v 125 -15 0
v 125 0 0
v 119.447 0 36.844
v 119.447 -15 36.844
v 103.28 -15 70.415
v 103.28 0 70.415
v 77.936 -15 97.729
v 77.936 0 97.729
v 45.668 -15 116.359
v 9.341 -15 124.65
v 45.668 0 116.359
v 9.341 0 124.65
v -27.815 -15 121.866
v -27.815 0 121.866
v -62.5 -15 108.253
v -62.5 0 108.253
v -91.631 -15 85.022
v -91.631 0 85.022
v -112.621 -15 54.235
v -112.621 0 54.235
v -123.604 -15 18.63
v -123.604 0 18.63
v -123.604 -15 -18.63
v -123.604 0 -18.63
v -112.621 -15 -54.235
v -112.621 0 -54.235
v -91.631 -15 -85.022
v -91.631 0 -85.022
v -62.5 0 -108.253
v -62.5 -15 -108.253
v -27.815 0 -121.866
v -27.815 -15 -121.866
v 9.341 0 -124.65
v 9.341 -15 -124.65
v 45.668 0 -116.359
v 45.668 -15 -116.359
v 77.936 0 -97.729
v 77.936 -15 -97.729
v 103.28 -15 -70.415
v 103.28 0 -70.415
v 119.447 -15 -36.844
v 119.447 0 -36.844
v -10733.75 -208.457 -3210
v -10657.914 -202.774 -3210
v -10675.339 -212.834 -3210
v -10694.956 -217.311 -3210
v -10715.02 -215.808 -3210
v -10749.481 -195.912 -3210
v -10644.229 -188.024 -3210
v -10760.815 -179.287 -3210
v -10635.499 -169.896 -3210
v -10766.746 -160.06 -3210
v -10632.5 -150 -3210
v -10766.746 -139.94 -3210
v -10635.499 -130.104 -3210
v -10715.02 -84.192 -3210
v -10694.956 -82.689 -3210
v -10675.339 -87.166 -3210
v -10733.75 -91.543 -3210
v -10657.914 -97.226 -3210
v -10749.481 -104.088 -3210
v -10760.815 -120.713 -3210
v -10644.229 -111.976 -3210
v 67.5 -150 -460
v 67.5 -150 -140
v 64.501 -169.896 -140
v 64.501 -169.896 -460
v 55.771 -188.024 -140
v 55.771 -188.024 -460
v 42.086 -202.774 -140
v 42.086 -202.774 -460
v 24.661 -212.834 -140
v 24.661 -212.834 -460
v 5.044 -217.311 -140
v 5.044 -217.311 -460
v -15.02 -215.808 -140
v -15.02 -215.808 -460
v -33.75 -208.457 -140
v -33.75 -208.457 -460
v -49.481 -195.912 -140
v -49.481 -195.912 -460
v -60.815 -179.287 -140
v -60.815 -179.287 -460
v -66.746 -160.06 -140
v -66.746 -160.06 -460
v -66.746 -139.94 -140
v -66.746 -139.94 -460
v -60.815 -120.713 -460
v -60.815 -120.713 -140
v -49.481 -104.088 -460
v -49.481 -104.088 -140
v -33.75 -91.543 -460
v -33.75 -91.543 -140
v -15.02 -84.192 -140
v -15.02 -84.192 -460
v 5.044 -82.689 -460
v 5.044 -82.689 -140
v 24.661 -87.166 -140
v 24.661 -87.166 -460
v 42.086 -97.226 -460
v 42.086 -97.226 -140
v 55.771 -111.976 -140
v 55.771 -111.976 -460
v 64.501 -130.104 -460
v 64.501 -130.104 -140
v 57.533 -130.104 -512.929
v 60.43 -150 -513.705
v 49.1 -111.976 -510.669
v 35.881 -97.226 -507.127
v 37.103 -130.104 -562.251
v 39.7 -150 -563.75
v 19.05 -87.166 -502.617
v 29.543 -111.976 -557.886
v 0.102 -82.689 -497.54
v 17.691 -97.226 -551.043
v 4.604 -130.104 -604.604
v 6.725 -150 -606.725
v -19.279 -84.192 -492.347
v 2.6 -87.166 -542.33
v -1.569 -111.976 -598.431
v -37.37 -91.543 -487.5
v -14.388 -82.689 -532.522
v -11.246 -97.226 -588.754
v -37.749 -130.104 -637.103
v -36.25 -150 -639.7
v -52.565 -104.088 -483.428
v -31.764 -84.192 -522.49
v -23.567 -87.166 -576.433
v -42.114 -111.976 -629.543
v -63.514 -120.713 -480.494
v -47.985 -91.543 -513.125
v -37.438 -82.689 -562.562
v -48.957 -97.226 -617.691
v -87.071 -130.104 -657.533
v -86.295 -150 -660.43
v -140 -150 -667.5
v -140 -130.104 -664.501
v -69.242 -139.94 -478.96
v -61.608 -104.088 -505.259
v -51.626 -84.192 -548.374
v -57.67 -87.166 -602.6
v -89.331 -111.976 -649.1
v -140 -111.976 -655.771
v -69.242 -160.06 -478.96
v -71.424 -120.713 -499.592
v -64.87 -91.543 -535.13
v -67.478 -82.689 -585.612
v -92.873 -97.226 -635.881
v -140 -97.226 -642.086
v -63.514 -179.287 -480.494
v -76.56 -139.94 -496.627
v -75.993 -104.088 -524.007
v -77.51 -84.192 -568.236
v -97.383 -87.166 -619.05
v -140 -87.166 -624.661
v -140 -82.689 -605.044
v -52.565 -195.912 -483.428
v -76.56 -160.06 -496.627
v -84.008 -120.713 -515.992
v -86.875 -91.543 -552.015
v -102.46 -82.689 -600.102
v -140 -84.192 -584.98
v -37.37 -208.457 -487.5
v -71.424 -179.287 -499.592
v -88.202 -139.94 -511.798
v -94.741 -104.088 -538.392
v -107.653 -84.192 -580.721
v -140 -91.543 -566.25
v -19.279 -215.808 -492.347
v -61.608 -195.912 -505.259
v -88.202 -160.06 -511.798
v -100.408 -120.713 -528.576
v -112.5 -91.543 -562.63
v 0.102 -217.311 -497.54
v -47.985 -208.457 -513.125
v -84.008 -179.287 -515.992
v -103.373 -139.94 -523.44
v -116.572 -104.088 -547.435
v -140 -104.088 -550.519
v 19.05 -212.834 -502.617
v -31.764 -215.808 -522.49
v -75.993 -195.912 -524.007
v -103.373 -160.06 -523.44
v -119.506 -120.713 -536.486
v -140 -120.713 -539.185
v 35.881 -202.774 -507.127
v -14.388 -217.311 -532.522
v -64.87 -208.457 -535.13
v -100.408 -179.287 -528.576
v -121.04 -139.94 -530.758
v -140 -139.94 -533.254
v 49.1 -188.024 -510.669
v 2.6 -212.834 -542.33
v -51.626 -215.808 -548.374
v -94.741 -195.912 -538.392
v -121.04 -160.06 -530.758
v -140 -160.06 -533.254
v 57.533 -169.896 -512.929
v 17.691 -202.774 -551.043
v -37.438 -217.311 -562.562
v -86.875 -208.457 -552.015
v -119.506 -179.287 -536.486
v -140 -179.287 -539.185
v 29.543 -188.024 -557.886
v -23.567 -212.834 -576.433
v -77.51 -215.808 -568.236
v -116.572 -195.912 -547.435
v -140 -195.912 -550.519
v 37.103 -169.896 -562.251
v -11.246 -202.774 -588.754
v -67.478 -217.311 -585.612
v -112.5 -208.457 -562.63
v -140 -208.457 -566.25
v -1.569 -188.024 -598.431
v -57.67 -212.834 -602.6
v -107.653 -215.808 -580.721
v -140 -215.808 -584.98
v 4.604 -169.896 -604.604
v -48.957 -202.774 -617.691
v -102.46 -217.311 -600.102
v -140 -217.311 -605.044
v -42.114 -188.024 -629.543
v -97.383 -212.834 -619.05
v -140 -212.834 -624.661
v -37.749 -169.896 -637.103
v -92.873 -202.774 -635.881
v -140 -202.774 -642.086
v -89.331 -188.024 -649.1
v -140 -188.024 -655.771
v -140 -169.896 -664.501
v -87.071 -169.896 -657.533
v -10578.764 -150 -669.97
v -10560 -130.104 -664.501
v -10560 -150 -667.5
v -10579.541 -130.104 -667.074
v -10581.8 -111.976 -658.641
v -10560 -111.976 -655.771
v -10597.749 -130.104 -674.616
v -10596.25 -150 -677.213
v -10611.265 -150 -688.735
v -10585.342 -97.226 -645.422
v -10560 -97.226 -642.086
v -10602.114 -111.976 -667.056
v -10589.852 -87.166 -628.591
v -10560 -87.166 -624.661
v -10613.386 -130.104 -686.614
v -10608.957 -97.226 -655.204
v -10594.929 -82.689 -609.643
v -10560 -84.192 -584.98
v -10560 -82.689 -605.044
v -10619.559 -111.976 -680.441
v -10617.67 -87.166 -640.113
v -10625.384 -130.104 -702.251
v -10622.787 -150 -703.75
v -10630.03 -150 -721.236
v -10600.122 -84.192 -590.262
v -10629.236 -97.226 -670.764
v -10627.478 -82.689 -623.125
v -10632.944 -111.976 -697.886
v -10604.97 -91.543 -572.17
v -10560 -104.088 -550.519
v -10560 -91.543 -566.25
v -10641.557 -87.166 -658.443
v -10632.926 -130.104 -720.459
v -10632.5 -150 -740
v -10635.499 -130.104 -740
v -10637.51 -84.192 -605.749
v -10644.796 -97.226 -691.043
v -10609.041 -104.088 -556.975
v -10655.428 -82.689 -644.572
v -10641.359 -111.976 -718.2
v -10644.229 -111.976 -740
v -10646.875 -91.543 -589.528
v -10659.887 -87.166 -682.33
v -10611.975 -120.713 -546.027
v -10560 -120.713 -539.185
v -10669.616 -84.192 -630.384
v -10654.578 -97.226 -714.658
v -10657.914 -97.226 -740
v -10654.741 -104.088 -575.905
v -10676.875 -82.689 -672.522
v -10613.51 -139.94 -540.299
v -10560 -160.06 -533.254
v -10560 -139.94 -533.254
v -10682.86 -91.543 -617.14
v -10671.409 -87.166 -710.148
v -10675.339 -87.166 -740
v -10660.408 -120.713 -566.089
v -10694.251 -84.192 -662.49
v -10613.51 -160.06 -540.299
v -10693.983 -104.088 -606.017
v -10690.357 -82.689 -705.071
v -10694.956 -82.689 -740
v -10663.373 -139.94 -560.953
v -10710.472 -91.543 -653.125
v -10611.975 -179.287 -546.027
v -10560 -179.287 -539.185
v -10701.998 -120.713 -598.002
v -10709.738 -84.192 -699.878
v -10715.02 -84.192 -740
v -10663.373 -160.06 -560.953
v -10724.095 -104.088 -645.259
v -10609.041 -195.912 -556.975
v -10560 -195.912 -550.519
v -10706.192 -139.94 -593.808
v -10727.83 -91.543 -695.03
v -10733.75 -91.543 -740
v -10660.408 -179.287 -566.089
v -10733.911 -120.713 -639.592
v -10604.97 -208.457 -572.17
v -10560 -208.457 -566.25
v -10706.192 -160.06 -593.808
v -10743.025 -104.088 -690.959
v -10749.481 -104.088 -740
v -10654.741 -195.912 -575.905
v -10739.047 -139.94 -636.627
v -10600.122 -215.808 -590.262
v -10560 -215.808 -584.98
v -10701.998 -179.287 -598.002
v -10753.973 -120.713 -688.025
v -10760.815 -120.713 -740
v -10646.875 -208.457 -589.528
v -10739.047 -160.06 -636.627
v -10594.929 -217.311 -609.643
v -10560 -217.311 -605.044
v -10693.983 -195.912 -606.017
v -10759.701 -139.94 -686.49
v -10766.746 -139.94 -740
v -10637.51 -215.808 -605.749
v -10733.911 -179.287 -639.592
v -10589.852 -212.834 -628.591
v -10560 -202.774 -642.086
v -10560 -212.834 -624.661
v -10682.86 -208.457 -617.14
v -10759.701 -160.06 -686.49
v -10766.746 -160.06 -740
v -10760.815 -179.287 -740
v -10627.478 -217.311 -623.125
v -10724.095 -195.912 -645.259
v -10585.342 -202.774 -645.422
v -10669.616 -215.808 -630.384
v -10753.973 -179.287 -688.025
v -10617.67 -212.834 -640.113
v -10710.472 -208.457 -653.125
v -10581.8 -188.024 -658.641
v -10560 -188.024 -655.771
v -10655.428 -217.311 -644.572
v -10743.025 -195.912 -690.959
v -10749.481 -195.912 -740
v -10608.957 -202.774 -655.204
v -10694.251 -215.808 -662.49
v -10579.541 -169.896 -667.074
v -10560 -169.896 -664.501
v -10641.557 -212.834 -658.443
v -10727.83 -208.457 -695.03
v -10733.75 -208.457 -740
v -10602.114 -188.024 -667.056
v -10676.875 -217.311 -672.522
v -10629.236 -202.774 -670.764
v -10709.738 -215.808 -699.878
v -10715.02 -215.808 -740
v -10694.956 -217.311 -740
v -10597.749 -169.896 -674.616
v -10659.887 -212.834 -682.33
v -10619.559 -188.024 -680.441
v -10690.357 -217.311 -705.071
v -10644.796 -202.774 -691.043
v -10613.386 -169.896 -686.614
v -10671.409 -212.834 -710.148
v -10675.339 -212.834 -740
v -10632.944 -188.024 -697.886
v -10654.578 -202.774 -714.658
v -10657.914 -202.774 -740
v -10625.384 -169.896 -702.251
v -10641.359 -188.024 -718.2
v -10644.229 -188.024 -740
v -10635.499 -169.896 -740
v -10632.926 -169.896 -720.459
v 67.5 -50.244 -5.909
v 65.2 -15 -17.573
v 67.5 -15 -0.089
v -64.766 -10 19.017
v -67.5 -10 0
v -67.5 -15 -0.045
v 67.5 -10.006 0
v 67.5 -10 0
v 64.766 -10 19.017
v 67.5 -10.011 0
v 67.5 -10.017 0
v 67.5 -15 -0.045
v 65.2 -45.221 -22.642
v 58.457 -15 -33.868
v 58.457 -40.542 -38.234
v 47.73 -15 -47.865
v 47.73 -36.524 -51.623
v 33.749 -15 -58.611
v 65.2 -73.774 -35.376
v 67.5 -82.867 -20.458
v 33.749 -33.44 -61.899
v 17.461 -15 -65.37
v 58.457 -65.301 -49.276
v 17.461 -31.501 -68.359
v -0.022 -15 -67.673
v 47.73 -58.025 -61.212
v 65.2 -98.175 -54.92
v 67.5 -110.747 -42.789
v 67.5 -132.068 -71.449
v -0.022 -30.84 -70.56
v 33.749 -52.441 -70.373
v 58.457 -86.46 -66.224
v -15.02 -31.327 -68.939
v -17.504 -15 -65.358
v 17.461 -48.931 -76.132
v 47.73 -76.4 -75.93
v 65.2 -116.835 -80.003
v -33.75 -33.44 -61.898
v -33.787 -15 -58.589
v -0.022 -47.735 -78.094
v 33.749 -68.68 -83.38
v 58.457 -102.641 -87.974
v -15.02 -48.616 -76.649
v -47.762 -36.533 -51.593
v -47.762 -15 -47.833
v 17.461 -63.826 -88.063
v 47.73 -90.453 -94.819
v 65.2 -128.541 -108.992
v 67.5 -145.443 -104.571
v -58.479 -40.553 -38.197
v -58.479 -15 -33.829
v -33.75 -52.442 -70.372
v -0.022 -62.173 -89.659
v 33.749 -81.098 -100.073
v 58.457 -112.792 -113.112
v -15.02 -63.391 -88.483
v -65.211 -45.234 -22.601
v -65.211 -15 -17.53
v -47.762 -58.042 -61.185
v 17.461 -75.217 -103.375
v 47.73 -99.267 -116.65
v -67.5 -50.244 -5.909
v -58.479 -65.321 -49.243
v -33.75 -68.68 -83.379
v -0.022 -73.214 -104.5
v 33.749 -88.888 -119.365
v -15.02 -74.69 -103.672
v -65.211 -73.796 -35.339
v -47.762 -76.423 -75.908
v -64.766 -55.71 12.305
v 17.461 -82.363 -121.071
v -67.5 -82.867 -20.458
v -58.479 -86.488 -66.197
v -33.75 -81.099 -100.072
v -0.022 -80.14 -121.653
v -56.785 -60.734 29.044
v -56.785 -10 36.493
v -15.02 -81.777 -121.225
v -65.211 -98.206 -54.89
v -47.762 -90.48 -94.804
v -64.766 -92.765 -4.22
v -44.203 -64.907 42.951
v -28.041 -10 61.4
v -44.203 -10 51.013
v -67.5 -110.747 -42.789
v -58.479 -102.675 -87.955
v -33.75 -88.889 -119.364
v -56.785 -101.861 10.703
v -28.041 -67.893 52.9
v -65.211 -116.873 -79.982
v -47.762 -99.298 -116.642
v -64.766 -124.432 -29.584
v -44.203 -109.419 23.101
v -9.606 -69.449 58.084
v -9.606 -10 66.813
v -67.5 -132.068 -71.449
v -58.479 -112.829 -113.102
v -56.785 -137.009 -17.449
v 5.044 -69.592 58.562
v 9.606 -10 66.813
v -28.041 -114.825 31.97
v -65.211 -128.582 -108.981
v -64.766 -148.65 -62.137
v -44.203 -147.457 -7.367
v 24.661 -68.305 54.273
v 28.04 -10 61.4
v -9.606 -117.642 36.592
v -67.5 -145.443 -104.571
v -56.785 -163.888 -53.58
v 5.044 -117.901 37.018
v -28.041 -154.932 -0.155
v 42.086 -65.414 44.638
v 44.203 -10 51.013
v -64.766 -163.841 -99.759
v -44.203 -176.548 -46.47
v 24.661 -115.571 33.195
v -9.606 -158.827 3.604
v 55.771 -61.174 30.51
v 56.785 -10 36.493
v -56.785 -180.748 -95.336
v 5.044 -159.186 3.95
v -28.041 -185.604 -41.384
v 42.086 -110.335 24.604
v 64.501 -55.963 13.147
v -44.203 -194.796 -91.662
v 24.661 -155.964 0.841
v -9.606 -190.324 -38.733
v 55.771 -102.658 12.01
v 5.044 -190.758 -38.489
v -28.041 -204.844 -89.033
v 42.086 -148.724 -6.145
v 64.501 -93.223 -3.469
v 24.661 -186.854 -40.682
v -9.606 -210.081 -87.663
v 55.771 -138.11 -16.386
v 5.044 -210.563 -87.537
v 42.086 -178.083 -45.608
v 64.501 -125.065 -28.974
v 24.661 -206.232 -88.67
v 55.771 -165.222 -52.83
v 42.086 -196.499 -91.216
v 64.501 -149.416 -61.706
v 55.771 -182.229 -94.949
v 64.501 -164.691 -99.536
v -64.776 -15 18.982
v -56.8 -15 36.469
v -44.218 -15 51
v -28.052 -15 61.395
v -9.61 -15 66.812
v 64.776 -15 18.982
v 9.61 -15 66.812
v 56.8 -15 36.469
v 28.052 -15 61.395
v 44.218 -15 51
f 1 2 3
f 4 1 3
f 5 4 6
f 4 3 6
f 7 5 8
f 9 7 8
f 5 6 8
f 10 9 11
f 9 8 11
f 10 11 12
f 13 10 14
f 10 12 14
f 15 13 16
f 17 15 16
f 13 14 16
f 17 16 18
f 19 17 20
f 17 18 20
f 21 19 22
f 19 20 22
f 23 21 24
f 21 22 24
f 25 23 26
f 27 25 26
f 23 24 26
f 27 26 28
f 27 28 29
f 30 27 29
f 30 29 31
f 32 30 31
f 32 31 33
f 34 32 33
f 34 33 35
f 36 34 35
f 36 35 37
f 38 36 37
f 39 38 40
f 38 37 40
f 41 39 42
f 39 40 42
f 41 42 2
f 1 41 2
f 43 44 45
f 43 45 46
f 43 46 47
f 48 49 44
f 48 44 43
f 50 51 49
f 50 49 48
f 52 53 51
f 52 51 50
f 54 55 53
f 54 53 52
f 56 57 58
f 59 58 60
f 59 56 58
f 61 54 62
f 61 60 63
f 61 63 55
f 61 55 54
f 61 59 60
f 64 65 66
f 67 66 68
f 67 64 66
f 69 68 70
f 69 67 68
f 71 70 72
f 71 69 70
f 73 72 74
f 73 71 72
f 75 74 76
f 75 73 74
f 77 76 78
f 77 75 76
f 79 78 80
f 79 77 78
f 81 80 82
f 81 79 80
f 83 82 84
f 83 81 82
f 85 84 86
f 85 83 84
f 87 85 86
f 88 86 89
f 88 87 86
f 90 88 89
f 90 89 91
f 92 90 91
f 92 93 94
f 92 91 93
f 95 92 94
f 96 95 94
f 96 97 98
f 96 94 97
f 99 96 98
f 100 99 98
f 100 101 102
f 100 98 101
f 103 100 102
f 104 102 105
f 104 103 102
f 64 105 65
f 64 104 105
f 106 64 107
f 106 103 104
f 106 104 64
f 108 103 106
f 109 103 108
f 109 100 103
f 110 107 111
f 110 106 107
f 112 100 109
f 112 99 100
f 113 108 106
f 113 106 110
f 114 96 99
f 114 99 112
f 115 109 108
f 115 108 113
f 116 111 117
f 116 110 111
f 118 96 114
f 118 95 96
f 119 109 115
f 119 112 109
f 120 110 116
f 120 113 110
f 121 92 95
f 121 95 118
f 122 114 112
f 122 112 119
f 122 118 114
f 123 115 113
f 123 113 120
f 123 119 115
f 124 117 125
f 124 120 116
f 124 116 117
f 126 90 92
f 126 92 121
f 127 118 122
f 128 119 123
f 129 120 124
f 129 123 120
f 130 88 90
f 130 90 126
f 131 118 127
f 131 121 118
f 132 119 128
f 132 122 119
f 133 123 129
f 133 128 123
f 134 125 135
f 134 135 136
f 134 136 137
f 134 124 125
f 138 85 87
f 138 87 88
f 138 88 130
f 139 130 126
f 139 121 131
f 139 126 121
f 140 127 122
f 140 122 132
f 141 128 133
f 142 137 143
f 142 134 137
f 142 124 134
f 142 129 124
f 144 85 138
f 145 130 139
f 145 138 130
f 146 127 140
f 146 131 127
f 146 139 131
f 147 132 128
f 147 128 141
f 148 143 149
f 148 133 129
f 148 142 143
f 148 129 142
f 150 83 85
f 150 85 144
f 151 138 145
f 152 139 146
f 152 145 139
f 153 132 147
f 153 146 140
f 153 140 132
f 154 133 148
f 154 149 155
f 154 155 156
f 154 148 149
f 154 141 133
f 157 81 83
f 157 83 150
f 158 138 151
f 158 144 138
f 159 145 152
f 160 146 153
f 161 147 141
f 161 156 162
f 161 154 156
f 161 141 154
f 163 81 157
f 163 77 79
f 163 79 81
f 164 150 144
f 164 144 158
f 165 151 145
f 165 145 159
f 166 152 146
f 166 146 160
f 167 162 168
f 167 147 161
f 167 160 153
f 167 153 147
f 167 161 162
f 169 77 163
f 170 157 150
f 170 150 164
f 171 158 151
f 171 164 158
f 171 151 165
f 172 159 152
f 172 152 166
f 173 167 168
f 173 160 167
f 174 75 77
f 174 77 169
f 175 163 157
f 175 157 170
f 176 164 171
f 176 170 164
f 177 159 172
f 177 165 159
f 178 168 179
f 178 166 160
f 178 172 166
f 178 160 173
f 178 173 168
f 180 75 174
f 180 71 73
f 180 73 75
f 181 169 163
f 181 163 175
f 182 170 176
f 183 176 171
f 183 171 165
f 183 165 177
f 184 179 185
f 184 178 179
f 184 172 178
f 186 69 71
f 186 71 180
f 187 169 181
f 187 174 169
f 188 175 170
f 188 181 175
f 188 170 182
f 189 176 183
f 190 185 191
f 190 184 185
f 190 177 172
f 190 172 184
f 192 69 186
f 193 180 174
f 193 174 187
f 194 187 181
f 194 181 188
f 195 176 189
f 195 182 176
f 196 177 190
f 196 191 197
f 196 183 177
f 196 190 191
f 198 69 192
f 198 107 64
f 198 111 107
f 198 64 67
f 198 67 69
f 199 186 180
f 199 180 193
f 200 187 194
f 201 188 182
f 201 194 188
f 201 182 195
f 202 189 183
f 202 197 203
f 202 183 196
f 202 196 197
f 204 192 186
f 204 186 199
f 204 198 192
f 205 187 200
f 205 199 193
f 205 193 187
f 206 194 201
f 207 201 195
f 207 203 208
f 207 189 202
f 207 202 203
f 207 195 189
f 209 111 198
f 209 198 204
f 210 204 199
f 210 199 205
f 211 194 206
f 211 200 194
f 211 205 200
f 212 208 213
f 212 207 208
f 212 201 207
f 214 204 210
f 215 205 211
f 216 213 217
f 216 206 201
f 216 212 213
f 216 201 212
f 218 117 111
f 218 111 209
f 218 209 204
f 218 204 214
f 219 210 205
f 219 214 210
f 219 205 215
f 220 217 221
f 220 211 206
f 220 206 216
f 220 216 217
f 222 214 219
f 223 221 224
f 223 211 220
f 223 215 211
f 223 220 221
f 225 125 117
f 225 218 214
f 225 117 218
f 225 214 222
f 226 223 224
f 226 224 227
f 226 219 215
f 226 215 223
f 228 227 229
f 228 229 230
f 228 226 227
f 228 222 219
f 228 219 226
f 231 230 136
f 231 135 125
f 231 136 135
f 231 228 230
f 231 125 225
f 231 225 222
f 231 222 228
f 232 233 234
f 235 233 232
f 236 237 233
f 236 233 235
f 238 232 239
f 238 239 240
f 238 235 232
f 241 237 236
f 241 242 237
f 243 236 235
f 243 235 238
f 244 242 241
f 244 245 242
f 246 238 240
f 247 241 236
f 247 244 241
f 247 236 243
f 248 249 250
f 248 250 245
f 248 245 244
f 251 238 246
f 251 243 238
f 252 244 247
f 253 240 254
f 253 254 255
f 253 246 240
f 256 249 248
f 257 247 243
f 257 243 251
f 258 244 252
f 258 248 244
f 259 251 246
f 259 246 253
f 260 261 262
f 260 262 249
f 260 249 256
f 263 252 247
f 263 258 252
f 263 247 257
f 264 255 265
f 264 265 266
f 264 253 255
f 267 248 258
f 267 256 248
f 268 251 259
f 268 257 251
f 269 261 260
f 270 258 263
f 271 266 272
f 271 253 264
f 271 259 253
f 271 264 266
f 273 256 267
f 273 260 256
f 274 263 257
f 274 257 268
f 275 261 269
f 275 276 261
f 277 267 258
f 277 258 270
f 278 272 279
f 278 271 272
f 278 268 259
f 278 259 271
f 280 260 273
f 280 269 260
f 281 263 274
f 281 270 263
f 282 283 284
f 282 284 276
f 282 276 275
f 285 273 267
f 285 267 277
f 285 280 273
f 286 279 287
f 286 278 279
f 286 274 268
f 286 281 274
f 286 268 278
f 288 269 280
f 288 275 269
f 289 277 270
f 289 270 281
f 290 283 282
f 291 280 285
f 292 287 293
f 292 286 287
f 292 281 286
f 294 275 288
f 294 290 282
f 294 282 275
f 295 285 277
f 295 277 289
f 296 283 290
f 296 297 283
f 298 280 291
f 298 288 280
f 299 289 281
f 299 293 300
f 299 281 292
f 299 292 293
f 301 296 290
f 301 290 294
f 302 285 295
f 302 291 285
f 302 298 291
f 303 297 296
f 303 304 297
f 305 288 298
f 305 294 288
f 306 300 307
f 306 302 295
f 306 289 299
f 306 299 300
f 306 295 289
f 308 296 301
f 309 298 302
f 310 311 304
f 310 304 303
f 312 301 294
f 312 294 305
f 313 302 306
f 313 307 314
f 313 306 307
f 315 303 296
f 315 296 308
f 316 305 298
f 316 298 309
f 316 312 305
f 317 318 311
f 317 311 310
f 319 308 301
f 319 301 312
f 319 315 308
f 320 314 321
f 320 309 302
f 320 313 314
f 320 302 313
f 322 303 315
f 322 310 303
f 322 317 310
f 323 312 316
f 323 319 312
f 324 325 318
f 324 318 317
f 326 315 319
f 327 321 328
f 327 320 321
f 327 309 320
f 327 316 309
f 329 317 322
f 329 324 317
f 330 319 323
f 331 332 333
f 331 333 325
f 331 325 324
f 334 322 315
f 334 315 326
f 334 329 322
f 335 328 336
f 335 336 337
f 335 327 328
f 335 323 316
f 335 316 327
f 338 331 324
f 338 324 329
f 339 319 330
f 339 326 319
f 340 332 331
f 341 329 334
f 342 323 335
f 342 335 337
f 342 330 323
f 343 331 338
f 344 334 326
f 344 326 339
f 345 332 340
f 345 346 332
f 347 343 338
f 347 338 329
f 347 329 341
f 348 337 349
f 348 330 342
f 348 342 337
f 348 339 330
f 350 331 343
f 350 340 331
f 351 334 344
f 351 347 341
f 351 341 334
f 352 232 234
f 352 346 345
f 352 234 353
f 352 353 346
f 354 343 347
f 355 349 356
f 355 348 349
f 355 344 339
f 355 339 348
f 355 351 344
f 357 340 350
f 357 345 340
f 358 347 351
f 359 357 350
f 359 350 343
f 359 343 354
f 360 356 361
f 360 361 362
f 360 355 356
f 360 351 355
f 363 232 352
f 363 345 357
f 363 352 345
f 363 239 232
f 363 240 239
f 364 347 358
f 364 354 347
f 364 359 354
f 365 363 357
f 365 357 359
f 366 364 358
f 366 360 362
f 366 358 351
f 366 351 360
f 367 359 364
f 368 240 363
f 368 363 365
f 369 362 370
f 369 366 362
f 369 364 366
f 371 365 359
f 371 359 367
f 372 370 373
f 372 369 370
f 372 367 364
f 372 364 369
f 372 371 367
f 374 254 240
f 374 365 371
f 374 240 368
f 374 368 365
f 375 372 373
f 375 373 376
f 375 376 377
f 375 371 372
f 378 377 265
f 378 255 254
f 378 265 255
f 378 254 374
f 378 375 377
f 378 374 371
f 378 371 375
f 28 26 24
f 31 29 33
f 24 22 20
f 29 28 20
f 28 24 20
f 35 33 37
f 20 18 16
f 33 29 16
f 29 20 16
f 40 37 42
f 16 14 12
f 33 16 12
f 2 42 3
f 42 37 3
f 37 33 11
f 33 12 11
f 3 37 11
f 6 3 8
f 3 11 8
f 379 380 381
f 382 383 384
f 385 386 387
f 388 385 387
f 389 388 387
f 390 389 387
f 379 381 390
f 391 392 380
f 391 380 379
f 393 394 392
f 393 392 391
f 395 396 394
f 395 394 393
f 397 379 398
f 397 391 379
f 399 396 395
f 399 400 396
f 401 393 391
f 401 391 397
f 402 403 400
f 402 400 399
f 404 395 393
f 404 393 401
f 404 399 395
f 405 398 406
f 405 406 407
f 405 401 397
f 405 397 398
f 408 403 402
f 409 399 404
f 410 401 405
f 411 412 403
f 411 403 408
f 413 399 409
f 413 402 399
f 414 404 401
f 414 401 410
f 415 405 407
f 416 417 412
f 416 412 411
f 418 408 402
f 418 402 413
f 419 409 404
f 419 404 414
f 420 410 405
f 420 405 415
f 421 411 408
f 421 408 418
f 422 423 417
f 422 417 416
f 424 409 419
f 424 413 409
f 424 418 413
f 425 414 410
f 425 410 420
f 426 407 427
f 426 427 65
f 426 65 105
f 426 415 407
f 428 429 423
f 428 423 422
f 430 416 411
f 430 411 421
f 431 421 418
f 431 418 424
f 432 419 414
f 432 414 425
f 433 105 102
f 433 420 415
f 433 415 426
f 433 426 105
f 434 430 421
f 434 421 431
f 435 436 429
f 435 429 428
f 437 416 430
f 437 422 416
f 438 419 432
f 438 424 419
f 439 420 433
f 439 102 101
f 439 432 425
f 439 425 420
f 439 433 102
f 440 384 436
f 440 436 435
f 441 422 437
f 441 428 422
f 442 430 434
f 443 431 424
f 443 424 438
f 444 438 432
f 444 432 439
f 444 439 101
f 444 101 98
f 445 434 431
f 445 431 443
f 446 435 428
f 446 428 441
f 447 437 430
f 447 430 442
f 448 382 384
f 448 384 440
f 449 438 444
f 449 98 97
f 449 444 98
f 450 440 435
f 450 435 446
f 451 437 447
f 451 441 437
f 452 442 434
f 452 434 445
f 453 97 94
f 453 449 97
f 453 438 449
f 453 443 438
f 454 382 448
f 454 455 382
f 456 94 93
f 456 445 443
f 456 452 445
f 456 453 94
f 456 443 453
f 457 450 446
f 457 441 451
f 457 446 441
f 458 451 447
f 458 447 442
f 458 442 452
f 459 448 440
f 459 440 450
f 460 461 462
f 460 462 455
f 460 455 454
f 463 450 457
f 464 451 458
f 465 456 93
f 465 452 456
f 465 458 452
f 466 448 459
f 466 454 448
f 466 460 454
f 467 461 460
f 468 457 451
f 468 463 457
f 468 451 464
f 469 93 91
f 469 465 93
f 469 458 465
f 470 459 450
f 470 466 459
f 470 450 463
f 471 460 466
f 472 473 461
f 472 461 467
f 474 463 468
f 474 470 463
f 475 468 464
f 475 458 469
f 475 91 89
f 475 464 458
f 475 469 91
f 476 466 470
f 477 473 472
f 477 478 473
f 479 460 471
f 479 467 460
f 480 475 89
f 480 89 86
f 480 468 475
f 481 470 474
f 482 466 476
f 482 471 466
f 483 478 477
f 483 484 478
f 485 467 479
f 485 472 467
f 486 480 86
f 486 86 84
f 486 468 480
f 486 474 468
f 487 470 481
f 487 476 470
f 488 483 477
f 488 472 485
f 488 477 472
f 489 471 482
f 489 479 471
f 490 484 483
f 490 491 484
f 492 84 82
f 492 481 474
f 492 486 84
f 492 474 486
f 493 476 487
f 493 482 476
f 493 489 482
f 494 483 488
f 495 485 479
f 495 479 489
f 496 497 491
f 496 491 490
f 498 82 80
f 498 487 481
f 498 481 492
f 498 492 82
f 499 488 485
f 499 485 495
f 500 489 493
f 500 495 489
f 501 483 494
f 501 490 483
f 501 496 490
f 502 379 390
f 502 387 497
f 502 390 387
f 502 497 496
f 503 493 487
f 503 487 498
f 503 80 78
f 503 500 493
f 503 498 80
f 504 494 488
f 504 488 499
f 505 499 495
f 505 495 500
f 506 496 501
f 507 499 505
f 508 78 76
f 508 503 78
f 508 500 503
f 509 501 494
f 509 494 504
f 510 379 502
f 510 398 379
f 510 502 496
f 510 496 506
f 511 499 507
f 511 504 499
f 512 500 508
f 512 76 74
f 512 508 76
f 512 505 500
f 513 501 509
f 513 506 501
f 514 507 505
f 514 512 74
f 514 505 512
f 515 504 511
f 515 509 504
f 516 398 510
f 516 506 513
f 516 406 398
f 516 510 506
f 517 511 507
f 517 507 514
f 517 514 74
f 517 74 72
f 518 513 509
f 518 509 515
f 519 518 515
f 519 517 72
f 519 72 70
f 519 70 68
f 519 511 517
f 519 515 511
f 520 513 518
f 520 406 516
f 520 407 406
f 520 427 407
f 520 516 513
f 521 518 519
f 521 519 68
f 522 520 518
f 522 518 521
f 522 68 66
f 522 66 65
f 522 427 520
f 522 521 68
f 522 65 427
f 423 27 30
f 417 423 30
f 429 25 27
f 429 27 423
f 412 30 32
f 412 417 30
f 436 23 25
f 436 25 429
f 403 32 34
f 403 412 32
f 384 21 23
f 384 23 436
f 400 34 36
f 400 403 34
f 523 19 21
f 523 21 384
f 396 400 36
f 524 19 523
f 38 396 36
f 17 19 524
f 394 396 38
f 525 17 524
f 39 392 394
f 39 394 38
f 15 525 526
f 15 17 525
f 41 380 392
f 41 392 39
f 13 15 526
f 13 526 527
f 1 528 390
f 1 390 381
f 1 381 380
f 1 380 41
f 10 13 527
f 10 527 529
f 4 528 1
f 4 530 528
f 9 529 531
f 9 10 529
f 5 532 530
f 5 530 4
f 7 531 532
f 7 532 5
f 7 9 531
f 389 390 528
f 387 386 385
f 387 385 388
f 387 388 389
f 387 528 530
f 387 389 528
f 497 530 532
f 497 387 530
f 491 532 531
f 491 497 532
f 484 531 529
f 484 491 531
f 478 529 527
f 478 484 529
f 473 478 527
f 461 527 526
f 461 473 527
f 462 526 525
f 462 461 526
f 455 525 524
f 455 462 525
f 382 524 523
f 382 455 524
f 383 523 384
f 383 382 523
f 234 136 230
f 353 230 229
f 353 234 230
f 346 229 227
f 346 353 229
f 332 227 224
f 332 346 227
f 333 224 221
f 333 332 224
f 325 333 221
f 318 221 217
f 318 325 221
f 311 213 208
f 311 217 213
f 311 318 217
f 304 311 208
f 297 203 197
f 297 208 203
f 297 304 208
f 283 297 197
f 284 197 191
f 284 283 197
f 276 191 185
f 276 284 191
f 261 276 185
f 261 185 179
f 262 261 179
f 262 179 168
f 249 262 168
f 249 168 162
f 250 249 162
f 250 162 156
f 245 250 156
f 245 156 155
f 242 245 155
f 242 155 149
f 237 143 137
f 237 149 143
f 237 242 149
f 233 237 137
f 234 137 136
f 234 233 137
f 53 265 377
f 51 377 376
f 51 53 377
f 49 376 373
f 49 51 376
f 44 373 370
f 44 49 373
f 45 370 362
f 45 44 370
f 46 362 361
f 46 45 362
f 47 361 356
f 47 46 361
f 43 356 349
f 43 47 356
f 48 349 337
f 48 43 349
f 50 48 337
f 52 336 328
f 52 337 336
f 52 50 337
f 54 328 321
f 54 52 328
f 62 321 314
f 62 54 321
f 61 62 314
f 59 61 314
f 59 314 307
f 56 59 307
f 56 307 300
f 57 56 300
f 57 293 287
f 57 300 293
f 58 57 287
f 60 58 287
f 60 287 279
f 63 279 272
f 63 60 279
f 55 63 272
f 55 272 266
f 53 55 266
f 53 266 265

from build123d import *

# Parameters (mm, degrees)
F0_R     = 67.5
F0_R_2   = 125
F5_DEPTH = 15


with BuildPart() as f4:
    # F4: sweep along a path in F1, F3
    with BuildLine(Plane.YZ) as f4_path:
        Line((0, 0), (-10, 0))
        ThreePointArc((-10, 0), (-108.9949493661, -41.0050506339), (-150, -140))
    with BuildLine(Plane.XZ.offset(150)) as f4_path_2:
        Line((0, -140), (0, -460))
        ThreePointArc((0, -460), (-41.0050506339, -558.9949493661), (-140, -600))
        Line((-140, -600), (-10560, -600))
        ThreePointArc((-10560, -600), (-10658.9949493661, -641.0050506339), (-10700, -740))
        Line((-10700, -740), (-10700, -3210))
    # F0 (on Front) → F4 (sweep)
    with BuildSketch(Plane.XZ):
        Circle(F0_R)
    sweep(path=f4_path.line + f4_path_2.line)

    # F0 (on Front) → F5 (join)
    with BuildSketch(Plane.XZ):
        Circle(F0_R_2)
        Circle(F0_R, mode=Mode.SUBTRACT)
    extrude(amount=F5_DEPTH)


solid = f4.part
